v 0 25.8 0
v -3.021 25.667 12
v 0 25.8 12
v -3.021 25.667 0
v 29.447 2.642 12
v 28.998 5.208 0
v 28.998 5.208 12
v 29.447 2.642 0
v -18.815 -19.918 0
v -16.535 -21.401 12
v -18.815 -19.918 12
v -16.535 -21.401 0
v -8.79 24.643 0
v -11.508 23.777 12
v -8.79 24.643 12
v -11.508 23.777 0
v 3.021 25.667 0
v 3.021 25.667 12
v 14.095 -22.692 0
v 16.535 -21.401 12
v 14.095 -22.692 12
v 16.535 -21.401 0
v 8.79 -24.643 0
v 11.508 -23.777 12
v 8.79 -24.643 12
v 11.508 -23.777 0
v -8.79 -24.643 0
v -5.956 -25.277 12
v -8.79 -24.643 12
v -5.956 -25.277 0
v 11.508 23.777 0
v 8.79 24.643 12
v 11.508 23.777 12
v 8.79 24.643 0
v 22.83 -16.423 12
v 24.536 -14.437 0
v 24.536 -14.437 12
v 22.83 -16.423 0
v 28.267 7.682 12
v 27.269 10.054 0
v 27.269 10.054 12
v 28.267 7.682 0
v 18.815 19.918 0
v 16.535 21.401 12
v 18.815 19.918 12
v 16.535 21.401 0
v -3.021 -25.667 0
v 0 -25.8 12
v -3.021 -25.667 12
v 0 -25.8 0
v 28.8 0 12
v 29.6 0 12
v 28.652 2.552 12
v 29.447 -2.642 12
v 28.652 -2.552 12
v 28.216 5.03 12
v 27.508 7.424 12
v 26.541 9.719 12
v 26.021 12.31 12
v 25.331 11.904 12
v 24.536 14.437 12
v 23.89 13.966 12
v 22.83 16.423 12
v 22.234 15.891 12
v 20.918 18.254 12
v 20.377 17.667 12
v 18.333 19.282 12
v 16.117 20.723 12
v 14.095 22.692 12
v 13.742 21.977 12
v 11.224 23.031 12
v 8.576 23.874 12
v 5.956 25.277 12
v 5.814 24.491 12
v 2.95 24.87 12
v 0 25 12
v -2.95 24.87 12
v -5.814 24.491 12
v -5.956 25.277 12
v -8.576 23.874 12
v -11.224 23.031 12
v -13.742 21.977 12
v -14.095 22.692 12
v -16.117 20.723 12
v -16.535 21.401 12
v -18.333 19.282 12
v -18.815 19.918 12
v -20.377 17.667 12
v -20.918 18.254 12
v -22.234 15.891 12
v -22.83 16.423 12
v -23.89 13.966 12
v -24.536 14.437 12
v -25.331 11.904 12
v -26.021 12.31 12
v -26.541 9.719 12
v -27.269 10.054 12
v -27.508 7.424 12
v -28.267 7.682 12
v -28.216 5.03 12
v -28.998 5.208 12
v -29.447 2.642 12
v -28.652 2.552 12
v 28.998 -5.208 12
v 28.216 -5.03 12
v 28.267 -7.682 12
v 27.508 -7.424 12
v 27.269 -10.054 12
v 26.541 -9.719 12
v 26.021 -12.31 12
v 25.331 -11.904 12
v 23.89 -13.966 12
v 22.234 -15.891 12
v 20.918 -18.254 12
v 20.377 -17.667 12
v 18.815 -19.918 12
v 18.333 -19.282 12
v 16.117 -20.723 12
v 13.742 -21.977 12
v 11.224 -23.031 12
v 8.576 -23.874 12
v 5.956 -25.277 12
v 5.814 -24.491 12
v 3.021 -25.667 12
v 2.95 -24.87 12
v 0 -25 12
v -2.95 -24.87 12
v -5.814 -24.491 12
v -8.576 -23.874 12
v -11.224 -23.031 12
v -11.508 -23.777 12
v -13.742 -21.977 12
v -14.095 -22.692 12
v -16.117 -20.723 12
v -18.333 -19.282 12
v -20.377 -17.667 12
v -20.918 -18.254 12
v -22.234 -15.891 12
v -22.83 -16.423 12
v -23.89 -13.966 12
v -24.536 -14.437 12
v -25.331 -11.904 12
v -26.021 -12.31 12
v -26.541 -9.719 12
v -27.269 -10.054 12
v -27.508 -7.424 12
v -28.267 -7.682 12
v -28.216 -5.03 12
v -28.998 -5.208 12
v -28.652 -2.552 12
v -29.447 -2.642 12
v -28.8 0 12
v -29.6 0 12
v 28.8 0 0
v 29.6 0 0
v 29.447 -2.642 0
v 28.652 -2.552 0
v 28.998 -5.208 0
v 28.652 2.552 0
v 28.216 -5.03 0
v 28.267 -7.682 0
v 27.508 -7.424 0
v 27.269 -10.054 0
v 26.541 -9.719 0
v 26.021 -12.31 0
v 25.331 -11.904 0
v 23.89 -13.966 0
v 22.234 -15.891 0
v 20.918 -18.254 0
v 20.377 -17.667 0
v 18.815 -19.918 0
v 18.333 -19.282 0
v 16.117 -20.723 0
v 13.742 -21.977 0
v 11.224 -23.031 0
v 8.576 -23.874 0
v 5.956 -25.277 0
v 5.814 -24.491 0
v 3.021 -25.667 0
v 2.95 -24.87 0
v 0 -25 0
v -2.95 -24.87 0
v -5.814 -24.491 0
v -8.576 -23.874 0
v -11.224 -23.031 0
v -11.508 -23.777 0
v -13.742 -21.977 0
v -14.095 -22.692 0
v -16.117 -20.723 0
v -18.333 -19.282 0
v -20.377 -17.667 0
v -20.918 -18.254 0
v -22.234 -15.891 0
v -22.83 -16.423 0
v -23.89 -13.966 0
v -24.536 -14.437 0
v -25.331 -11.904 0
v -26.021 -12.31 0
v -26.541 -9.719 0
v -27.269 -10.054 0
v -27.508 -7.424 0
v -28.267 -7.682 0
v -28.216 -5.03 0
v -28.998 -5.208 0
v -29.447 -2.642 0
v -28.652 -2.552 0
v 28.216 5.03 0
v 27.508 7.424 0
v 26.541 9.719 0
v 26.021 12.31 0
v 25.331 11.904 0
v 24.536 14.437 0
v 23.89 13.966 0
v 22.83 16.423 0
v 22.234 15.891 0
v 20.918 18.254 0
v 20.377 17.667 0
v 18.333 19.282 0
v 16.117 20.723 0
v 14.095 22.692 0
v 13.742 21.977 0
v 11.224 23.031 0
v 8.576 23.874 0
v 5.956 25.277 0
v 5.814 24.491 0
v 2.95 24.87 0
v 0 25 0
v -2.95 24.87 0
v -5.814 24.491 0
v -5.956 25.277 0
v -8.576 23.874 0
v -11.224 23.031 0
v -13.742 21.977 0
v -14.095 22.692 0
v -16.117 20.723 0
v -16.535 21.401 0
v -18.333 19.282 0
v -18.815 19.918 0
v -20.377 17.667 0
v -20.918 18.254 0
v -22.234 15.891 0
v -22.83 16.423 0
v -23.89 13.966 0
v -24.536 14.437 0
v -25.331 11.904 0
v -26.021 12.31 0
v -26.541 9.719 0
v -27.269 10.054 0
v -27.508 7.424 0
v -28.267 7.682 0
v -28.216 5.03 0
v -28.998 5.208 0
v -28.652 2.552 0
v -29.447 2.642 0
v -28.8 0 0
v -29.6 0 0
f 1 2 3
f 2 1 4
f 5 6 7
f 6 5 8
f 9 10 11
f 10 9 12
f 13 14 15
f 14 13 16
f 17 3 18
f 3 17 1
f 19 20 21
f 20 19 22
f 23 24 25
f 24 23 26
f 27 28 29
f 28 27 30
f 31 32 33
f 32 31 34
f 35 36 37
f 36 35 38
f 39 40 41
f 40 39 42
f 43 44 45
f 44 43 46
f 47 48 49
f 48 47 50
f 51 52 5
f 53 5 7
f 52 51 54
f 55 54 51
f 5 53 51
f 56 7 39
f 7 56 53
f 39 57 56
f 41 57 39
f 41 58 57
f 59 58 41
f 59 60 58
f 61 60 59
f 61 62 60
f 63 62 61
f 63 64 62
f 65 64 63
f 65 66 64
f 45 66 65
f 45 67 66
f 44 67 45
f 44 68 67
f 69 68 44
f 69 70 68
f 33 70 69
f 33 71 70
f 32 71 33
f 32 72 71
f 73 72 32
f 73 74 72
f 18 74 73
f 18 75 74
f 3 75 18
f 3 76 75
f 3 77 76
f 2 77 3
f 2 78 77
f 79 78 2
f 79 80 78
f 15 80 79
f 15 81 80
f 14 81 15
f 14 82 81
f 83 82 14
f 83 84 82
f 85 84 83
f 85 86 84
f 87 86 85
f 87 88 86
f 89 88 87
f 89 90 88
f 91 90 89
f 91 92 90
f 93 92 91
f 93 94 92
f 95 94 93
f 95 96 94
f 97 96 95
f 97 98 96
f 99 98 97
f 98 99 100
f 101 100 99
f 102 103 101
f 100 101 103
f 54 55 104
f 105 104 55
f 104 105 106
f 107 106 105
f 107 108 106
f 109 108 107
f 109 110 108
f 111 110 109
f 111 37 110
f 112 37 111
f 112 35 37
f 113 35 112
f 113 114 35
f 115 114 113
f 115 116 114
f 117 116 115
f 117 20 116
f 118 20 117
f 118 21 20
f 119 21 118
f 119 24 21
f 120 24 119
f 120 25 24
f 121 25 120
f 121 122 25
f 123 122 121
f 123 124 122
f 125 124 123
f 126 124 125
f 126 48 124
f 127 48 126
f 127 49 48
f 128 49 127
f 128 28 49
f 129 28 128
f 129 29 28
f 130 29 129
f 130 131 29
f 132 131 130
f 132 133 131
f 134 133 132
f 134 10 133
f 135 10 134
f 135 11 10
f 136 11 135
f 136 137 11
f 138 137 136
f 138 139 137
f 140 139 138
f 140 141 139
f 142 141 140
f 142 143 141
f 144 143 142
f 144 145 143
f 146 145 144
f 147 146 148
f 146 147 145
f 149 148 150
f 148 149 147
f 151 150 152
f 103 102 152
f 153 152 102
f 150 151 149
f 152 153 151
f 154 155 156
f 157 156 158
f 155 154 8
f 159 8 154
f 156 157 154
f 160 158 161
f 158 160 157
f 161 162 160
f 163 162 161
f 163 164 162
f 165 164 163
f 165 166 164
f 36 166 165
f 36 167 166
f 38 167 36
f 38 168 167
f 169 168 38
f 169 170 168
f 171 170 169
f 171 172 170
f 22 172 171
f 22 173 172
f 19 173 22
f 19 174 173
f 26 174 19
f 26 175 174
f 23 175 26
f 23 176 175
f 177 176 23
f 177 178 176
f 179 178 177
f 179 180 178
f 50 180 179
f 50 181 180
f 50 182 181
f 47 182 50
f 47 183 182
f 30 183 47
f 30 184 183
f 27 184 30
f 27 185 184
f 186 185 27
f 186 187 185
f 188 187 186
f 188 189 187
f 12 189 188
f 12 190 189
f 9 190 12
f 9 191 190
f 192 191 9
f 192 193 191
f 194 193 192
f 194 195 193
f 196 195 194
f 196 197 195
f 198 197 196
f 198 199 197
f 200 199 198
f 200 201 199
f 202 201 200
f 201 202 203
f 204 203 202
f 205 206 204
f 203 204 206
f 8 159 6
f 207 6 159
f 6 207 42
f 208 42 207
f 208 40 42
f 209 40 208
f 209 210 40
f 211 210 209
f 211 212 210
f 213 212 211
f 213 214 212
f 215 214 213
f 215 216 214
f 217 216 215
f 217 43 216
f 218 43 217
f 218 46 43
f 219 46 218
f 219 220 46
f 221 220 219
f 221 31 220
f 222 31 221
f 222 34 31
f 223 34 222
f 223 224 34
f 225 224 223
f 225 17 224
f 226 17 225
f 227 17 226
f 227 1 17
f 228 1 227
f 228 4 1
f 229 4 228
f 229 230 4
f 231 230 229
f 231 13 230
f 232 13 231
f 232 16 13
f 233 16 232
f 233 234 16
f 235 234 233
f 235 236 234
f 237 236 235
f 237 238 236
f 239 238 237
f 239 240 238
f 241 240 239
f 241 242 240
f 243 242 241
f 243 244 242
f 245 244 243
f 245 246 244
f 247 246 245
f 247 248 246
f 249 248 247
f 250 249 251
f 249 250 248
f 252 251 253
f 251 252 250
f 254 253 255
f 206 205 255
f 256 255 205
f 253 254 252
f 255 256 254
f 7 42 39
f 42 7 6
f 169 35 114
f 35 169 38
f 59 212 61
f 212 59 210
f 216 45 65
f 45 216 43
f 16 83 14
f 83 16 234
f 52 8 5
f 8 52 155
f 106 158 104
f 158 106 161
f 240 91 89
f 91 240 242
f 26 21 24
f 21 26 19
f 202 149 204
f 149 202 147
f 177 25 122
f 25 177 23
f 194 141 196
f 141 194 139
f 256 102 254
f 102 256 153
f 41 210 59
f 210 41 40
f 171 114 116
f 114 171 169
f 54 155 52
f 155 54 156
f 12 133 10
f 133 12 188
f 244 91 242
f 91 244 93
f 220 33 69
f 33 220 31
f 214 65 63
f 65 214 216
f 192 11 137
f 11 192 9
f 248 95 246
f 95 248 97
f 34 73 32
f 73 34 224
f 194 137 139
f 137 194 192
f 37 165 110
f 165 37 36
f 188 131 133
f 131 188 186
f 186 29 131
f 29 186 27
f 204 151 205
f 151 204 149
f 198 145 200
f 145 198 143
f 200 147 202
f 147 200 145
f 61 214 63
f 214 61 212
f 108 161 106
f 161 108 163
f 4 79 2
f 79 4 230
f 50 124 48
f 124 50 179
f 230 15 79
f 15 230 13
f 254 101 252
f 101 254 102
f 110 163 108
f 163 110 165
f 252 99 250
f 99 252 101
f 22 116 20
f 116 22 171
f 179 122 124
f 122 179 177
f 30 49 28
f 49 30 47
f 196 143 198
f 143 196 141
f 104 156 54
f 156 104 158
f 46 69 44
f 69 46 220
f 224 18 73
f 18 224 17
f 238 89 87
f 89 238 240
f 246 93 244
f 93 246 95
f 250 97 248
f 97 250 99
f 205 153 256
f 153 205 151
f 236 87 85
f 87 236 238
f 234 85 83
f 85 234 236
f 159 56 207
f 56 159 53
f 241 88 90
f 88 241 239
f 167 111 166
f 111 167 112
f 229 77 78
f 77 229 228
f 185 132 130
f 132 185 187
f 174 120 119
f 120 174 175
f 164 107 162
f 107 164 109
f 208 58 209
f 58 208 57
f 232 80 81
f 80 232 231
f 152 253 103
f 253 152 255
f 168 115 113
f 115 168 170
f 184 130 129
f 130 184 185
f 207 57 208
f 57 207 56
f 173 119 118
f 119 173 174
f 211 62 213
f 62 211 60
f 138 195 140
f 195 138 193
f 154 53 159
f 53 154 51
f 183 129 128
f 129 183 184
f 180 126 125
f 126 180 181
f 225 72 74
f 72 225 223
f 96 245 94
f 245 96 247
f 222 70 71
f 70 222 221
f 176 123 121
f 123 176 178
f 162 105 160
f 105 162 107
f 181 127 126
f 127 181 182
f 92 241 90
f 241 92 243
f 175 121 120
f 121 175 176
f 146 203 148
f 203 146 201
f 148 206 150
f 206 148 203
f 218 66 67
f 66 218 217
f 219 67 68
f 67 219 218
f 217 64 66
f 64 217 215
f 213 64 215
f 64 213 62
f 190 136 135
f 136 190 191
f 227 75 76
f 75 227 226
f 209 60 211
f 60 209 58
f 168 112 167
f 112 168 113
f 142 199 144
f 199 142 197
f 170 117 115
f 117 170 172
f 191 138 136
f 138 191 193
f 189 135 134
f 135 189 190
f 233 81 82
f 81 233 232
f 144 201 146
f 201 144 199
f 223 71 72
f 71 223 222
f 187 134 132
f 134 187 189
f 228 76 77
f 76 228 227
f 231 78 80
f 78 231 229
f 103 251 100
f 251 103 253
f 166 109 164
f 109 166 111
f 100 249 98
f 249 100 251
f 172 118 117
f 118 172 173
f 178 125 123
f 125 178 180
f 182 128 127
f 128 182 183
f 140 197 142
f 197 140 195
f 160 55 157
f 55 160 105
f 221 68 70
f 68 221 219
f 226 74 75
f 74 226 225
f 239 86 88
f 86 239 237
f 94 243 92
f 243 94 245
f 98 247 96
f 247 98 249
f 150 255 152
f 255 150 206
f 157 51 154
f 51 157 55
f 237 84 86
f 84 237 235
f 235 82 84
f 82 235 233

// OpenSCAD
// Module names are of the form poly_<inkscape-path-id>().  As a result,
// you can associate a polygon in this OpenSCAD program with the corresponding
// SVG element in the Inkscape document by looking for the XML element with
// the attribute id="inkscape-path-id".

// fudge value is used to ensure that subtracted solids are a tad taller
// in the z dimension than the polygon being subtracted from.  This helps
// keep the resulting .stl file manifold.
fudge = 0.1;

module poly_path4146(h)
{
  scale([25.4/90, -25.4/90, 1]) union()
  {
    difference()
    {
       linear_extrude(height=h)
         polygon([[0.000002,-91.417968],[-10.704384,-90.947058],[-21.103966,-89.564677],[-31.145511,-87.316348],[-40.775785,-84.247595],[-49.941553,-80.403941],[-58.589583,-75.830910],[-66.666640,-70.574024],[-74.119491,-64.678809],[-80.894902,-58.190786],[-86.939638,-51.155480],[-92.200467,-43.618414],[-96.624155,-35.625110],[-100.157466,-27.221094],[-102.747169,-18.451888],[-104.340029,-9.363015],[-104.882812,0.000001],[-104.340029,9.363016],[-102.747169,18.451888],[-100.157466,27.221094],[-96.624155,35.625110],[-92.200467,43.618413],[-86.939638,51.155479],[-80.894902,58.190785],[-74.119491,64.678808],[-66.666640,70.574024],[-58.589583,75.830909],[-49.941553,80.403940],[-40.775785,84.247594],[-31.145511,87.316348],[-21.103966,89.564677],[-10.704384,90.947058],[0.000002,91.417968],[10.704388,90.947058],[21.103970,89.564677],[31.145515,87.316348],[40.775788,84.247594],[49.941556,80.403940],[58.589586,75.830909],[66.666643,70.574024],[74.119493,64.678808],[80.894903,58.190785],[86.939640,51.155479],[92.200468,43.618413],[96.624155,35.625110],[100.157467,27.221094],[102.747169,18.451888],[104.340029,9.363016],[104.882812,0.000001],[104.340029,-9.363015],[102.747169,-18.451888],[100.157467,-27.221094],[96.624155,-35.625110],[92.200468,-43.618414],[86.939640,-51.155480],[80.894903,-58.190786],[74.119493,-64.678809],[66.666643,-70.574024],[58.589586,-75.830910],[49.941556,-80.403941],[40.775788,-84.247595],[31.145515,-87.316348],[21.103970,-89.564677],[10.704388,-90.947058],[0.000002,-91.417968]]);
       translate([0, 0, -fudge])
         linear_extrude(height=h+2*fudge)
           polygon([[0.000002,-88.582030],[10.452935,-88.123621],[20.599514,-86.778361],[30.388958,-84.591207],[39.770486,-81.607111],[48.693316,-77.871029],[57.106666,-73.427916],[64.959755,-68.322724],[72.201802,-62.600410],[78.782025,-56.305927],[84.649642,-49.484230],[89.753873,-42.180273],[94.043935,-34.439011],[97.469048,-26.305398],[99.978429,-17.824389],[101.521298,-9.040938],[102.046872,0.000001],[101.521298,9.040940],[99.978429,17.824391],[97.469048,26.305401],[94.043935,34.439013],[89.753873,42.180275],[84.649642,49.484232],[78.782025,56.305928],[72.201802,62.600411],[64.959755,68.322724],[57.106666,73.427915],[48.693316,77.871028],[39.770486,81.607110],[30.388958,84.591205],[20.599514,86.778359],[10.452935,88.123618],[0.000002,88.582028],[-10.452931,88.123618],[-20.599510,86.778359],[-30.388955,84.591205],[-39.770483,81.607110],[-48.693313,77.871028],[-57.106664,73.427915],[-64.959753,68.322724],[-72.201801,62.600411],[-78.782024,56.305928],[-84.649643,49.484232],[-89.753874,42.180275],[-94.043937,34.439013],[-97.469050,26.305401],[-99.978431,17.824391],[-101.521300,9.040940],[-102.046874,0.000001],[-101.521300,-9.040938],[-99.978431,-17.824389],[-97.469050,-26.305398],[-94.043937,-34.439011],[-89.753874,-42.180273],[-84.649643,-49.484230],[-78.782024,-56.305927],[-72.201801,-62.600410],[-64.959753,-68.322724],[-57.106664,-73.427916],[-48.693313,-77.871029],[-39.770483,-81.607111],[-30.388955,-84.591207],[-20.599510,-86.778361],[-10.452931,-88.123621],[0.000002,-88.582030]]);
    }
  }
}

poly_path4146(12);
